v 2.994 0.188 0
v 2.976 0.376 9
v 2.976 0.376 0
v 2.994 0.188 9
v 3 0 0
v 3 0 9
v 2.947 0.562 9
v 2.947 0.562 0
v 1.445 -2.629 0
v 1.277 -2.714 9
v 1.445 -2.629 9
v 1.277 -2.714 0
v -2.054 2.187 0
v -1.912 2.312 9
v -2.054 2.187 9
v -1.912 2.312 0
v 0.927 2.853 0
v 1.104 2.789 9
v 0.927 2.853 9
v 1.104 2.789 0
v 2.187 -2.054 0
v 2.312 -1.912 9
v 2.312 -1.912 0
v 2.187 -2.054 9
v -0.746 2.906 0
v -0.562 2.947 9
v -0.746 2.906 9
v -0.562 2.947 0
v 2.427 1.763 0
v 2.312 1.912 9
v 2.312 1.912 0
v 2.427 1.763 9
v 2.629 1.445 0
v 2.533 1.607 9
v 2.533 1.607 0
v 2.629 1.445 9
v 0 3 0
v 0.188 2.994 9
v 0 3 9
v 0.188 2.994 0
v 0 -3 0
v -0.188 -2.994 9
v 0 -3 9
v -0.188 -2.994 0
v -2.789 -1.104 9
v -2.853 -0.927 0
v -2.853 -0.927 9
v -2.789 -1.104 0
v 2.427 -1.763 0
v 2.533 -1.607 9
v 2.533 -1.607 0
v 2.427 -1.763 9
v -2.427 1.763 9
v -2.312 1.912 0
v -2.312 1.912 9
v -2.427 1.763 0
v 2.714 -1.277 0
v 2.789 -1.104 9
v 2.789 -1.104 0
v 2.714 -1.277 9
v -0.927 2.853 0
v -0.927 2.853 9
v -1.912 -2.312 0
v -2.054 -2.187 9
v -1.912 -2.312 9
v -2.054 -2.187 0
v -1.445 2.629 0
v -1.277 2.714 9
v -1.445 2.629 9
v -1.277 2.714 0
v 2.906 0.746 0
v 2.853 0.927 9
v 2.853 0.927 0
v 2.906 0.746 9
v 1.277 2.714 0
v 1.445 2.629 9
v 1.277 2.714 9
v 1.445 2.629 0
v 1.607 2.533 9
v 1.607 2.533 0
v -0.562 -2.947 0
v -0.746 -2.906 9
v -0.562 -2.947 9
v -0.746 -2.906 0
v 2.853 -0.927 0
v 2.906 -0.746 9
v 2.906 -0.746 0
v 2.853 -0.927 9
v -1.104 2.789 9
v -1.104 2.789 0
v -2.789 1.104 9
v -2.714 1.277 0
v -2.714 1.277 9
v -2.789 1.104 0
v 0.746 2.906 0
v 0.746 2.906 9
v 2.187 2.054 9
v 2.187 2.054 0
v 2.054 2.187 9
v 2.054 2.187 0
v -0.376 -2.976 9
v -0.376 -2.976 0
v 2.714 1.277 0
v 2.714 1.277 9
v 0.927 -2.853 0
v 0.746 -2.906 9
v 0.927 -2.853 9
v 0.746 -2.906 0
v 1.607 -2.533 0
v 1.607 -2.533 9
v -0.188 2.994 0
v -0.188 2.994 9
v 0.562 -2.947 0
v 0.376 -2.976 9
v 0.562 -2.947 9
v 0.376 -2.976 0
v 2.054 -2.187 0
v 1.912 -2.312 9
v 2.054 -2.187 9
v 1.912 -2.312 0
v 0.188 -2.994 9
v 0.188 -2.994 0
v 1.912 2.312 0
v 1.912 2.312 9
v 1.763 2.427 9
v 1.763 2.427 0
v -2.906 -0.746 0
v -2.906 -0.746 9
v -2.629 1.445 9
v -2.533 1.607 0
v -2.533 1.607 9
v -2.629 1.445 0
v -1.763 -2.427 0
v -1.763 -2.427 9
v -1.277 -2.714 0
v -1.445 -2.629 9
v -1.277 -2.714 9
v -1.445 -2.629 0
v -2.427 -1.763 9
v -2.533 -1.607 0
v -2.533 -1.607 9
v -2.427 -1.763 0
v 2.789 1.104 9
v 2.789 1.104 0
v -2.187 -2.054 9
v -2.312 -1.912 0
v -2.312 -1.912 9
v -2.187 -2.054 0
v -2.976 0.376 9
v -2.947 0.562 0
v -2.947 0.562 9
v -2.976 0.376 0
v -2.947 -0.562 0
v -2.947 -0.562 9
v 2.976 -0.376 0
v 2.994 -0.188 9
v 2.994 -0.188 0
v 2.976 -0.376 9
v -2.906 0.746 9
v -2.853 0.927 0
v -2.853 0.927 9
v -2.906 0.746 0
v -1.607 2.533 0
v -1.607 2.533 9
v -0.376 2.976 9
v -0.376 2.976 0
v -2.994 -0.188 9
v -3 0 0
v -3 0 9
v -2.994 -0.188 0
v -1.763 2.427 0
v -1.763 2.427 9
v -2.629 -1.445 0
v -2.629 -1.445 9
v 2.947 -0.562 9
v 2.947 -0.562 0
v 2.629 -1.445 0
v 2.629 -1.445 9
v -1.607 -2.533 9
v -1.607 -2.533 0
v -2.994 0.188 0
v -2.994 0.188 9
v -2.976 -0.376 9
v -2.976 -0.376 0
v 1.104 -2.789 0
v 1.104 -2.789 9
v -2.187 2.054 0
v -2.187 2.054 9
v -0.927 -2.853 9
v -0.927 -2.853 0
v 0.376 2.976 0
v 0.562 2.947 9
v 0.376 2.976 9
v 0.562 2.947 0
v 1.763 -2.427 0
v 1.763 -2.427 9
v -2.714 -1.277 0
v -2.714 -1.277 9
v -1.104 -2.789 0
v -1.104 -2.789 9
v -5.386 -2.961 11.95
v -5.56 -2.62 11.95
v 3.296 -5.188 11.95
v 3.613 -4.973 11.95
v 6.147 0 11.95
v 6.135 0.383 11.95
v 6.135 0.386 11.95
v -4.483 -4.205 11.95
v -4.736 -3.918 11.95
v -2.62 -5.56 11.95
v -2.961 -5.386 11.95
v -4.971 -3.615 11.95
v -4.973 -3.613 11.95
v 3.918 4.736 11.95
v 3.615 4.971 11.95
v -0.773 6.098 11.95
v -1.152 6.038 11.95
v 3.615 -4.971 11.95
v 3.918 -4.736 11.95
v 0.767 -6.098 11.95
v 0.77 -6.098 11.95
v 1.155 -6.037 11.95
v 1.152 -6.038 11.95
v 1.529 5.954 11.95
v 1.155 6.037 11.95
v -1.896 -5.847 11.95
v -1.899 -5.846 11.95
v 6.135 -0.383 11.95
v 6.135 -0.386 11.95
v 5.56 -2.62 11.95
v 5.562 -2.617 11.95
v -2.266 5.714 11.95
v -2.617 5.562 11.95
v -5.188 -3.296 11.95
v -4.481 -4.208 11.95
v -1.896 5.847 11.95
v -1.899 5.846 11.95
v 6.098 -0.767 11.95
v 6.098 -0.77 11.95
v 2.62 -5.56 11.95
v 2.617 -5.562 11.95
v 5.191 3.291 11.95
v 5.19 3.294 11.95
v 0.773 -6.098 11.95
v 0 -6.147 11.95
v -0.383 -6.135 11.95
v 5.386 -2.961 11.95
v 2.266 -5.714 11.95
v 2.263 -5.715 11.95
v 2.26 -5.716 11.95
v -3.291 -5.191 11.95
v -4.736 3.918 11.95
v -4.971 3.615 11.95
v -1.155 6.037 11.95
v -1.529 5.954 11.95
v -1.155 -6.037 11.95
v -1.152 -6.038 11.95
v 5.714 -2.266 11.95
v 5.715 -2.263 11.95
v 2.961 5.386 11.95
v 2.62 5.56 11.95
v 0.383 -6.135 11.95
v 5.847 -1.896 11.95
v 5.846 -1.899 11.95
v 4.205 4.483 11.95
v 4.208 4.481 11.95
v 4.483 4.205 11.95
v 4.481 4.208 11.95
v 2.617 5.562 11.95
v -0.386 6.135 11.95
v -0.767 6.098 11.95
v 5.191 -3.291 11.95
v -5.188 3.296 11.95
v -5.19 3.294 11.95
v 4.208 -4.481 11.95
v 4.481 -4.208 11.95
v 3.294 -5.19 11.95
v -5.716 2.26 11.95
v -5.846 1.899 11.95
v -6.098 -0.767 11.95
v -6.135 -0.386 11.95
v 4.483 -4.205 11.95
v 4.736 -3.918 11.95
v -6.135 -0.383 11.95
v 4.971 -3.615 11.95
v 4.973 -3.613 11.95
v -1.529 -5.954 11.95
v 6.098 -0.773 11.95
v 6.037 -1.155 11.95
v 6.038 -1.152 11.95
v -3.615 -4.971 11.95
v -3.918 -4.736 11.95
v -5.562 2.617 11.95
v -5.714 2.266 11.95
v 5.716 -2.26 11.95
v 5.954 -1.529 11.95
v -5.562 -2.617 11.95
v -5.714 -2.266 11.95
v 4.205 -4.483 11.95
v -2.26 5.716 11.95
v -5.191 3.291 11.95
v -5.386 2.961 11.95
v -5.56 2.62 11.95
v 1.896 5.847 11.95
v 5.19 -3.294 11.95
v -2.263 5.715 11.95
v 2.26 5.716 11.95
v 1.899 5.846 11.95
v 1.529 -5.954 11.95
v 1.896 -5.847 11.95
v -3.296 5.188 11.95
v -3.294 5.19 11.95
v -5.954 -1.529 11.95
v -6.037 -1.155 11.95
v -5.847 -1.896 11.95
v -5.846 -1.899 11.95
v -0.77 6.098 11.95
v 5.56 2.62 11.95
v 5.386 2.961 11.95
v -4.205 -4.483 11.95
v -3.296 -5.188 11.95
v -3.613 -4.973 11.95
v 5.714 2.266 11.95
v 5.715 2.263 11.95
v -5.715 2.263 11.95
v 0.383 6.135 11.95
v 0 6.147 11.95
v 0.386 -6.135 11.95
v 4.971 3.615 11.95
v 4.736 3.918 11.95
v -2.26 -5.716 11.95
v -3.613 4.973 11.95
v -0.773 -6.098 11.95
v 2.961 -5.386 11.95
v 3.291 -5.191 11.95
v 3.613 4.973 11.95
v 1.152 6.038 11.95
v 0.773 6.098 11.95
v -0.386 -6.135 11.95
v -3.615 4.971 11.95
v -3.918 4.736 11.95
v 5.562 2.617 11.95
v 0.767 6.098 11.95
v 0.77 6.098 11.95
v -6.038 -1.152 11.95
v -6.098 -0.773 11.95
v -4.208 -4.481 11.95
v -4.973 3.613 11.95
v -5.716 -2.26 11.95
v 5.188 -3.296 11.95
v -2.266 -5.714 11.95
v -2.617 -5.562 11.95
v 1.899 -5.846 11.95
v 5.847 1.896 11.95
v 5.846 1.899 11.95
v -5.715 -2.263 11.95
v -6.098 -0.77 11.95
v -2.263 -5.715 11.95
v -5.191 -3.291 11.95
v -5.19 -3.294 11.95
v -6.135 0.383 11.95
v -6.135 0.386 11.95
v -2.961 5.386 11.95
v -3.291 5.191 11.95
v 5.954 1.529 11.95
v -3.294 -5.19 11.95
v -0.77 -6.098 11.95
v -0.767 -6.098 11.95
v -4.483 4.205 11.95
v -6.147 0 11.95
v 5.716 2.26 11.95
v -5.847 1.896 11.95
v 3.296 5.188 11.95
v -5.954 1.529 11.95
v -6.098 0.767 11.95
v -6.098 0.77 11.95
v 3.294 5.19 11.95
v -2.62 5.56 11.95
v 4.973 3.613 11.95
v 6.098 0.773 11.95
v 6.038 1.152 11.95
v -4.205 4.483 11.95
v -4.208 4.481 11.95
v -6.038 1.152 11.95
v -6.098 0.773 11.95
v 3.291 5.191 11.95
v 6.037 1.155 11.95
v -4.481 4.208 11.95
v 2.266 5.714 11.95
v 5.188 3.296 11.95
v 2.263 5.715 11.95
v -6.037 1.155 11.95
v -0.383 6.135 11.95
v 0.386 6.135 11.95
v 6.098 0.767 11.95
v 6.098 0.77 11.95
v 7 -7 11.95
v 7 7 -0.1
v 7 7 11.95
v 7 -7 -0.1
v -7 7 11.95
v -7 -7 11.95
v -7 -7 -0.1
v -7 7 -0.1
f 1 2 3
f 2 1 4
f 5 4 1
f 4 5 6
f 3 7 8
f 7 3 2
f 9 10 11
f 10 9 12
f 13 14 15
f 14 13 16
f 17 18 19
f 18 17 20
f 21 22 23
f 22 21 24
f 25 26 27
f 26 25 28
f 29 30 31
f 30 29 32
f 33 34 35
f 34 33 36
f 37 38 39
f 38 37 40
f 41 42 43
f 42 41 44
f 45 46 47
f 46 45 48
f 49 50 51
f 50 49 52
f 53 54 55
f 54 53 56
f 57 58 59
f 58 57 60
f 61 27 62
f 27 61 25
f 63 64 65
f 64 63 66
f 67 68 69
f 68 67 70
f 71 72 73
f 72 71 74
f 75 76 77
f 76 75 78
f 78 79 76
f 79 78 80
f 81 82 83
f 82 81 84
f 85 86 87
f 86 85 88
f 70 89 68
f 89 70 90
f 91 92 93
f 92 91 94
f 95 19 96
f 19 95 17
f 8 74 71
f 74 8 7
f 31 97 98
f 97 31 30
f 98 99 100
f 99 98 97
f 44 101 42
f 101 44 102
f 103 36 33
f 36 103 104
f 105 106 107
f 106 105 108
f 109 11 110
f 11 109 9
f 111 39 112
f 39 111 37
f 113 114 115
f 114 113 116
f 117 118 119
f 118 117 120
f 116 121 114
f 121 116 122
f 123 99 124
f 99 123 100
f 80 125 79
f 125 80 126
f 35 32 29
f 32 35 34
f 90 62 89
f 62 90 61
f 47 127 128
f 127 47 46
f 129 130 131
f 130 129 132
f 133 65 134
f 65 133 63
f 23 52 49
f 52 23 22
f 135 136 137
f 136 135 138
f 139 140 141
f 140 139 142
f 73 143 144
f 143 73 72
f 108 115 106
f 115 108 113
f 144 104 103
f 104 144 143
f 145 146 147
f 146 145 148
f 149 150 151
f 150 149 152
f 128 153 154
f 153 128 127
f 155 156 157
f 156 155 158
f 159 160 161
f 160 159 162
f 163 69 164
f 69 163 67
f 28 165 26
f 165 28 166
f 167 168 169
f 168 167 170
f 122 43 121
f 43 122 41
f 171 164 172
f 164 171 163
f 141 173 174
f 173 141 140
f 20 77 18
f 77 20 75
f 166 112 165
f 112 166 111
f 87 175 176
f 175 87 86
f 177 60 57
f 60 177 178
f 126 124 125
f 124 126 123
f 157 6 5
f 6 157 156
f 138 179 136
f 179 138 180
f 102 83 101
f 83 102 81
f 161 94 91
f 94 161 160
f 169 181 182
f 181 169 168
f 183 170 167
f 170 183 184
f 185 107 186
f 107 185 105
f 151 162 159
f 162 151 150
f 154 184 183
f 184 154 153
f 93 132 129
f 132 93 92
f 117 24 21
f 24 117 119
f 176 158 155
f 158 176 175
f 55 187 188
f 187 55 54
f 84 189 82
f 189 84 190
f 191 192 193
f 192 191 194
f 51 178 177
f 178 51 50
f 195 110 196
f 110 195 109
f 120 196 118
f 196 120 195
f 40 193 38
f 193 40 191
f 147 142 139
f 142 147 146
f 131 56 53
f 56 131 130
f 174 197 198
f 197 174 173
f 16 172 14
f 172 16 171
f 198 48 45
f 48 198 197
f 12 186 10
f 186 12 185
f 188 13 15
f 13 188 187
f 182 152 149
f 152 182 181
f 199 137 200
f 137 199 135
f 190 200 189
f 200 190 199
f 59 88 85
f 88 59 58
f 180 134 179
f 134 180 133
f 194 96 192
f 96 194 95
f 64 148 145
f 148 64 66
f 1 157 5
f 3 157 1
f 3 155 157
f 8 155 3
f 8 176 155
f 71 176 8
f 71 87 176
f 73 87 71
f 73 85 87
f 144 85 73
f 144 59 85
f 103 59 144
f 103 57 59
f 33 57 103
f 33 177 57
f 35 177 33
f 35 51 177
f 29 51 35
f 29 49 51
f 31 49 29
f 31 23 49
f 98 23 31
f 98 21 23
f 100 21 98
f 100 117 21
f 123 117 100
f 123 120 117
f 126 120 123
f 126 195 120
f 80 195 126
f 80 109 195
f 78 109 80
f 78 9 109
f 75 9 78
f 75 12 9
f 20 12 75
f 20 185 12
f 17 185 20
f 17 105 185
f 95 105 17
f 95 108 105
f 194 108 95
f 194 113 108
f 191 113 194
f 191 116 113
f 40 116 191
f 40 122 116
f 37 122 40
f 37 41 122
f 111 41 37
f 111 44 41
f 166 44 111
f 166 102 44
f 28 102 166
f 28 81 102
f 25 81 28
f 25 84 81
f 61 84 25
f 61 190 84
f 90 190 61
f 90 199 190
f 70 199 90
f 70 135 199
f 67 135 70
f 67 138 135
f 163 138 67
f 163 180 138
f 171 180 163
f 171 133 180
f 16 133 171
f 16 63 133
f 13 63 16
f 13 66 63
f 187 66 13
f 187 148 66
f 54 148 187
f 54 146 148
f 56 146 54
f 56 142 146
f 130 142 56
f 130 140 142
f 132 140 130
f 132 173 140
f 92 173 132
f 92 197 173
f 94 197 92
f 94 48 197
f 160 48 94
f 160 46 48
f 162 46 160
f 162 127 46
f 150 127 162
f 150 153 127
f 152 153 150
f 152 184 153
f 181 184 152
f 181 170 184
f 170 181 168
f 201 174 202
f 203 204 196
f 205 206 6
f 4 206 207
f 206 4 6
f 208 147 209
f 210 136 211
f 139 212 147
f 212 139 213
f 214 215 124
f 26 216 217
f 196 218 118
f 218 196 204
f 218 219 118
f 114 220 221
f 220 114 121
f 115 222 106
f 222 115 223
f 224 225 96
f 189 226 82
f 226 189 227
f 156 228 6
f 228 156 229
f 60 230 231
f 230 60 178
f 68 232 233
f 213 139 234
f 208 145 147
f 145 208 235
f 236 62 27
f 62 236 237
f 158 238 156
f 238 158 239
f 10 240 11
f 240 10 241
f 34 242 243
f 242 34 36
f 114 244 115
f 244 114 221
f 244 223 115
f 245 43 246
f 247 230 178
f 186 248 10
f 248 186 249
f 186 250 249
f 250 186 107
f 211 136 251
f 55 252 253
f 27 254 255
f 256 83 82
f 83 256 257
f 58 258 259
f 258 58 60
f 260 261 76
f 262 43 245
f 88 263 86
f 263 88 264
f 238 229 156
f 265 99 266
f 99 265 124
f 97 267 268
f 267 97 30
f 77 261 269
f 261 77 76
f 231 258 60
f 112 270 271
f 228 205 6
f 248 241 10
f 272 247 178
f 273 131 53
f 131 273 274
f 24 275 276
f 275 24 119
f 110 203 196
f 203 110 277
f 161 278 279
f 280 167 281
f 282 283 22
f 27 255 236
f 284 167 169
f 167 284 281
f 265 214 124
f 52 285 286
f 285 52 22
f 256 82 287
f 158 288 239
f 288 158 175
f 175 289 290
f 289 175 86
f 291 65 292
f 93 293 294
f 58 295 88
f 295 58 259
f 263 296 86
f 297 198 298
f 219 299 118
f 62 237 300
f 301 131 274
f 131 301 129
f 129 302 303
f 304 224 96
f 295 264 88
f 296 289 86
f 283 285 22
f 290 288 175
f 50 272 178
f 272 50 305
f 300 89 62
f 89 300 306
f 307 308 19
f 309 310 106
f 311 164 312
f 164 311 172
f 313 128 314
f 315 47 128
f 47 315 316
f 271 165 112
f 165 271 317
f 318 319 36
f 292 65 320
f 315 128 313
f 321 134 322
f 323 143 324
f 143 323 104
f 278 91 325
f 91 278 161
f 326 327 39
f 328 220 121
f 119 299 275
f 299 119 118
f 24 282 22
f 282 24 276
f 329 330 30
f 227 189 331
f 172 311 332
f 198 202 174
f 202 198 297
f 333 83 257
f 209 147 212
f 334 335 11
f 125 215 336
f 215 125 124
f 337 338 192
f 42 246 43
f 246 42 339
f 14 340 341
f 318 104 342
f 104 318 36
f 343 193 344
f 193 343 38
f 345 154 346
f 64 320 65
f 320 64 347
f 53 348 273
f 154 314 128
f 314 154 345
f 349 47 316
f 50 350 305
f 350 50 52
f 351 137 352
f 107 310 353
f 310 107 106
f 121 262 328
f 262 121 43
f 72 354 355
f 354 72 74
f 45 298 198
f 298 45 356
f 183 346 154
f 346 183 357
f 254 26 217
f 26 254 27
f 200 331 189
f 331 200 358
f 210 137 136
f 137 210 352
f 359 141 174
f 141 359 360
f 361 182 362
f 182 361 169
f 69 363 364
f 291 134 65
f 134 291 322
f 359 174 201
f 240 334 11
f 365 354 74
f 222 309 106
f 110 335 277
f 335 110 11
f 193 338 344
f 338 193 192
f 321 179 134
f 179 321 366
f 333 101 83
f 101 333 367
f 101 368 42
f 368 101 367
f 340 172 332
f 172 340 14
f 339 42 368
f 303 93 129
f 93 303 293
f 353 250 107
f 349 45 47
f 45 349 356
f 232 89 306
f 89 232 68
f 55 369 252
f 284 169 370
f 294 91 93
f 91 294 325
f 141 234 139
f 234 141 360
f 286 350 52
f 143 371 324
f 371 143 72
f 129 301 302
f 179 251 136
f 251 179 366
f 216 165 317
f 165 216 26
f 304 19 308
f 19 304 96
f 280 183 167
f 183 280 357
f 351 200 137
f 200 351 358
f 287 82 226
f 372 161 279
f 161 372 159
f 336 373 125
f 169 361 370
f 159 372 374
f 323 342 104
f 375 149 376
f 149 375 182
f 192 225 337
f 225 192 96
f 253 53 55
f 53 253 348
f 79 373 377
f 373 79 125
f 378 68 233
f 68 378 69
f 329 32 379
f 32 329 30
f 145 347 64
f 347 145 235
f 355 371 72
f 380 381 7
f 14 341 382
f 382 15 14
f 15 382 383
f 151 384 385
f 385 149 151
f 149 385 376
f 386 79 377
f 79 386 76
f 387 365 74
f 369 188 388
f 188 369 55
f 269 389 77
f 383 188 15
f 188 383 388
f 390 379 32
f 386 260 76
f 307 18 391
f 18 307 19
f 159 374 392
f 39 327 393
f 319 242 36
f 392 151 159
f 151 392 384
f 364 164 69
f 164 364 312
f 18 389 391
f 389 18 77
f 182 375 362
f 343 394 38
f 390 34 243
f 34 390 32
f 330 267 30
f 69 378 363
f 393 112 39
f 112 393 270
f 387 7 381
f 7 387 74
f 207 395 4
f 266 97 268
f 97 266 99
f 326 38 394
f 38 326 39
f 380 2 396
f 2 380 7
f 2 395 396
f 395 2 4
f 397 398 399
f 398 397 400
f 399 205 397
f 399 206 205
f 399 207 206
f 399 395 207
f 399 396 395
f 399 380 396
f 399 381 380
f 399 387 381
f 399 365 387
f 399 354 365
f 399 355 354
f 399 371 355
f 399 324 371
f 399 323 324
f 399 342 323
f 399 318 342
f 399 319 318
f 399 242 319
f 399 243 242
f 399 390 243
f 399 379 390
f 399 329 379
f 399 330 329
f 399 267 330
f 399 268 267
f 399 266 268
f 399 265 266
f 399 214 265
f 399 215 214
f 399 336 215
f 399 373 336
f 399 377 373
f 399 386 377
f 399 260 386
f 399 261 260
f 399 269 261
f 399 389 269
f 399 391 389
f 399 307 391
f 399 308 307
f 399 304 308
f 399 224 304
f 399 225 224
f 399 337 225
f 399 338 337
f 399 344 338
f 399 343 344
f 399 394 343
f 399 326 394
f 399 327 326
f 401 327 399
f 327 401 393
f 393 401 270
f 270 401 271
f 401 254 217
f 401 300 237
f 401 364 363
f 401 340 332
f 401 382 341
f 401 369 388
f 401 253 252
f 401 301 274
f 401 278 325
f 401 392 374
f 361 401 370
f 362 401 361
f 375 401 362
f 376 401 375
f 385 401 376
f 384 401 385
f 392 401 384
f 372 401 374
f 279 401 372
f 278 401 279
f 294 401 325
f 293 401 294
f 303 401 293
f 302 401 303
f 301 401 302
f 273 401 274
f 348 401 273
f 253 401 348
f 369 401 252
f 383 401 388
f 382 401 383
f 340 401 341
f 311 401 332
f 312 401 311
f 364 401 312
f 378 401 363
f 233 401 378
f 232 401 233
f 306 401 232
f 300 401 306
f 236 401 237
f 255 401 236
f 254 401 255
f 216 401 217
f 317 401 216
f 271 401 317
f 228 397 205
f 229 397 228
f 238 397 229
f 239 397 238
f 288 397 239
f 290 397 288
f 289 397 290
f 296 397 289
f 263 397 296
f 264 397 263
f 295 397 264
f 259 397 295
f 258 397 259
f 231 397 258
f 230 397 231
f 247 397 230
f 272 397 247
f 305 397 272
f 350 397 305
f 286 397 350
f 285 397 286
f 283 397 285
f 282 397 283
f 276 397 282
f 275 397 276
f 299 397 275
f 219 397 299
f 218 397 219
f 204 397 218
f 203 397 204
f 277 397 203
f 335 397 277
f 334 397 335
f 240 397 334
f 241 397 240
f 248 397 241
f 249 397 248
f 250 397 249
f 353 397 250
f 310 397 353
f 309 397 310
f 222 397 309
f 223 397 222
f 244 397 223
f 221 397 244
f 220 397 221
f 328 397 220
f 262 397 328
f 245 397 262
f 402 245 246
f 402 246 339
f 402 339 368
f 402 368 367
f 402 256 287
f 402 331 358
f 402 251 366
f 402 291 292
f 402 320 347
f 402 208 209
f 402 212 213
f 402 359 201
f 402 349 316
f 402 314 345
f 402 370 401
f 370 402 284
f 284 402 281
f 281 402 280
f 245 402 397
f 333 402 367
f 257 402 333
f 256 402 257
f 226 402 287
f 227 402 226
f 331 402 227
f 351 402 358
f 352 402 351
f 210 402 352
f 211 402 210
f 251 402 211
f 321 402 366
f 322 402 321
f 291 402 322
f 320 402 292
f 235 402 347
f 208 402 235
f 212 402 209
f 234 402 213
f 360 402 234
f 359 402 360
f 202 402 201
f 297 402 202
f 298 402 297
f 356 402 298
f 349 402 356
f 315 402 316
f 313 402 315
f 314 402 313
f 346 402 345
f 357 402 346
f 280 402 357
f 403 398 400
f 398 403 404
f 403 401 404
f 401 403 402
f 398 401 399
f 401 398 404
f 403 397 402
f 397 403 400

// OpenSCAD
// file: m4_countersunk.scad
// Countersunk Bolt with Selectable Sizes (ISO 10642, No Thread)

// Dictionary of screw sizes and their parameters
screw_specs = [
    ["M3", 3, 6.0, 1.65],  // [Name, Shaft Diameter, Head Diameter, Head Height]
    ["M4", 4, 8.4, 2.2],
    ["M5", 5, 10.4, 2.5],
    ["M6", 6, 12.4, 3.0]
];

// Function to get parameters for a given screw type
function get_screw_spec(type) =
    let(specs = [for (s = screw_specs) if (s[0] == type) s],
        spec = len(specs) > 0 ? specs[0] : undef)
    spec == undef ? assert(false, str("Error: Unknown screw type '", type, "'. Available types: M3, M4, M5, M6")) : spec;

module countersunk_bolt(type = "M4", position = [0, 0, 0], orientation = [0, 0, 0], total_length = 10) {
    // Get parameters based on type
    spec = get_screw_spec(type);
    shaft_diameter = spec[1];
    head_diameter = spec[2];
    head_height = spec[3];
    shaft_length = max(0, total_length - head_height); // Ensure non-negative shaft length

    translate(position) rotate(orientation)
    render() difference() {
        union() {
            // Shaft (adjusted so total bolt length matches input length)
            cylinder(h=shaft_length, d=shaft_diameter, $fn=100);
            
            // Corrected Countersunk Head Orientation
            translate([0,0,shaft_length])
                cylinder(h=head_height, d1=shaft_diameter, d2=head_diameter, $fn=100);
        }
    }
}
// main file
use <m4_countersunk.scad>;

difference() {
    translate([-7, -7, -0.1])
    cube([14, 14, 12.05]);
    countersunk_bolt("M6", [0, 0, 0], [0, 0, 0], 12);
}
